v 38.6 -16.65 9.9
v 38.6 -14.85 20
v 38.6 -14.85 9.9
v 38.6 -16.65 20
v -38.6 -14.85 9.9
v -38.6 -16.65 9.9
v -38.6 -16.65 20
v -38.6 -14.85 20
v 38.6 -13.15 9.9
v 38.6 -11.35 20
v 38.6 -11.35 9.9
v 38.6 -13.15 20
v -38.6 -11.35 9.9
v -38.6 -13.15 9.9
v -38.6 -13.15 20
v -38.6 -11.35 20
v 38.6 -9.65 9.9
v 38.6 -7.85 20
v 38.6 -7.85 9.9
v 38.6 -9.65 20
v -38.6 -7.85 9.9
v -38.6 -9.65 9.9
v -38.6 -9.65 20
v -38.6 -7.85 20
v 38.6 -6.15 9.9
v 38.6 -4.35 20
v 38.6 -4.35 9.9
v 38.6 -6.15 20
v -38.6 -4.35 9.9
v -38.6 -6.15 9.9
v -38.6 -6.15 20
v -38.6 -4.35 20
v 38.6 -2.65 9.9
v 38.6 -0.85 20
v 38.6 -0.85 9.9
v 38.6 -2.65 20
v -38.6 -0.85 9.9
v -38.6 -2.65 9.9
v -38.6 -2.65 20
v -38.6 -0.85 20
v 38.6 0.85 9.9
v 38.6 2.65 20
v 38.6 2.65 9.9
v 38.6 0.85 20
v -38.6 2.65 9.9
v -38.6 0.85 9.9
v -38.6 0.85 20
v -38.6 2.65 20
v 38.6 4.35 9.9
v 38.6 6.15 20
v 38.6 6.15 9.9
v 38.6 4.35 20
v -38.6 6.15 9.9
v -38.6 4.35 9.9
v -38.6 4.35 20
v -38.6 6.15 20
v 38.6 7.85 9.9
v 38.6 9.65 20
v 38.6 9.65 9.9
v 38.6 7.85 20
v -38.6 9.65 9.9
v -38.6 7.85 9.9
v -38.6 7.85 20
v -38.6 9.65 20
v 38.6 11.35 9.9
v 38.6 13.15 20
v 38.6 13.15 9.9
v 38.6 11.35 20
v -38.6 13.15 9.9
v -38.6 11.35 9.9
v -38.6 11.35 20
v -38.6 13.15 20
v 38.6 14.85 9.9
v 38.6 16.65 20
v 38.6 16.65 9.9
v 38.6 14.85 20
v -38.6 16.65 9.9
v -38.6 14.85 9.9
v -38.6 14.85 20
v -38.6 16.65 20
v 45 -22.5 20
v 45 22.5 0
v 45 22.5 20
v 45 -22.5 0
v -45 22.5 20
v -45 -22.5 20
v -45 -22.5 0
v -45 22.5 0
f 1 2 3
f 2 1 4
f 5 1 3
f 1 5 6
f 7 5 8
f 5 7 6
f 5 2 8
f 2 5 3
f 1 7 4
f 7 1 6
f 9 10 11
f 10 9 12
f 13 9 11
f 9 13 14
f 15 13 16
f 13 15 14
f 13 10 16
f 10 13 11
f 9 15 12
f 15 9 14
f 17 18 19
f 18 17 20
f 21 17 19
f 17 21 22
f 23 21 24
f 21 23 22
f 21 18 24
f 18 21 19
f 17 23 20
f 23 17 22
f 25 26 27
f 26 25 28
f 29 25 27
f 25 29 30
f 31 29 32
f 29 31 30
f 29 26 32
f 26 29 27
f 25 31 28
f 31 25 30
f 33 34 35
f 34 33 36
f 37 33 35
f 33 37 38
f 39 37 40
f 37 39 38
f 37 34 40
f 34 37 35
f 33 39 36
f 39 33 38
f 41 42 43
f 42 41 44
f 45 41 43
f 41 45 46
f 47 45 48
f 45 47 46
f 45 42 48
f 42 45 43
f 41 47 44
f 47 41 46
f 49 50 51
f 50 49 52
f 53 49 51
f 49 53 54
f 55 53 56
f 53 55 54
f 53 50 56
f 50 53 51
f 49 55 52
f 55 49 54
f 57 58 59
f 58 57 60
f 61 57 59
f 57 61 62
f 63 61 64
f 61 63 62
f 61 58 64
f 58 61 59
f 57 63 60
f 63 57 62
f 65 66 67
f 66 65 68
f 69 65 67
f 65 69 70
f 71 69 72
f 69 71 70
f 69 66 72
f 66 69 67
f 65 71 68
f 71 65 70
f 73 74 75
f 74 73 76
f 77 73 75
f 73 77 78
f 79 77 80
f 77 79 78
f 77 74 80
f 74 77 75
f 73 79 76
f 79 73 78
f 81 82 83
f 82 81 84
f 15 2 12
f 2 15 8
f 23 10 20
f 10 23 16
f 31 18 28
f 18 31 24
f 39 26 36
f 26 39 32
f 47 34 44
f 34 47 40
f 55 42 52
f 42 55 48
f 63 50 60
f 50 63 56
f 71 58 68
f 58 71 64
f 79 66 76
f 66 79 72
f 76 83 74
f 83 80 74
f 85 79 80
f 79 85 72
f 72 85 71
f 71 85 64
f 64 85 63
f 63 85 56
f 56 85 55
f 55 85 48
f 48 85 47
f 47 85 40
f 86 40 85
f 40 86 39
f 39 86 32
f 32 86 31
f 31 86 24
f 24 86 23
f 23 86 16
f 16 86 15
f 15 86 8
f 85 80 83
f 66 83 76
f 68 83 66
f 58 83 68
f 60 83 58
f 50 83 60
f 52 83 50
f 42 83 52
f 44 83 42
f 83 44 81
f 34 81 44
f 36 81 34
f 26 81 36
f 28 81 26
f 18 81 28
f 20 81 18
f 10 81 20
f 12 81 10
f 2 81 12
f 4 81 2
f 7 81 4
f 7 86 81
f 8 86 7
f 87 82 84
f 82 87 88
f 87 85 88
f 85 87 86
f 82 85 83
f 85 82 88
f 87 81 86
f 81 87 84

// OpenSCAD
// ---------------
// Parameters (mm)
// ---------------
$fn = 64;               // resolution for any curved primitives

base_len   = 90;    // X length of the base block
base_wid   = 45;    // Y width of the base block
base_h     = 20;    // Z height of the base block

slot_len   = 77;    // Length of each slot along X
slot_wid   = 1.6;   // Width of each slot along Y
slot_depth = 10;    // Depth of each slot down from the top face

slot_count = 10;    // Number of slots
slot_spacing = 3.5; // Centre‑to‑centre spacing of slots in Y

extra = 0.2;        // Clearance added to each cut face (mm)

// Pre‑computed total span of the slot group (centre‑to‑centre)
total_span = (slot_count - 1) * slot_spacing;

// ---------------
// Modules
// ---------------

// Solid base block (resting on XY plane, centred in X and Y)
module base_block() {
    translate([0, 0, base_h/2])
        cube([base_len, base_wid, base_h], center = true);
}

// Cutting shape for a single slot (centered at its own origin)
module slot_cut() {
    cube([slot_len + extra,
          slot_wid + extra,
          slot_depth + extra],
         center = true);
}

// ---------------
// Model
// ---------------
difference() {
    // Solid base
    base_block();

    // Slots cut out of the top face
    for (i = [0 : slot_count-1]) {
        translate([
            0,                                   // X centre (block centred)
            -total_span/2 + i * slot_spacing,   // Y centre of this slot
            base_h - slot_depth/2                // Z centre (just above top)
        ])
            slot_cut();
    }
}
